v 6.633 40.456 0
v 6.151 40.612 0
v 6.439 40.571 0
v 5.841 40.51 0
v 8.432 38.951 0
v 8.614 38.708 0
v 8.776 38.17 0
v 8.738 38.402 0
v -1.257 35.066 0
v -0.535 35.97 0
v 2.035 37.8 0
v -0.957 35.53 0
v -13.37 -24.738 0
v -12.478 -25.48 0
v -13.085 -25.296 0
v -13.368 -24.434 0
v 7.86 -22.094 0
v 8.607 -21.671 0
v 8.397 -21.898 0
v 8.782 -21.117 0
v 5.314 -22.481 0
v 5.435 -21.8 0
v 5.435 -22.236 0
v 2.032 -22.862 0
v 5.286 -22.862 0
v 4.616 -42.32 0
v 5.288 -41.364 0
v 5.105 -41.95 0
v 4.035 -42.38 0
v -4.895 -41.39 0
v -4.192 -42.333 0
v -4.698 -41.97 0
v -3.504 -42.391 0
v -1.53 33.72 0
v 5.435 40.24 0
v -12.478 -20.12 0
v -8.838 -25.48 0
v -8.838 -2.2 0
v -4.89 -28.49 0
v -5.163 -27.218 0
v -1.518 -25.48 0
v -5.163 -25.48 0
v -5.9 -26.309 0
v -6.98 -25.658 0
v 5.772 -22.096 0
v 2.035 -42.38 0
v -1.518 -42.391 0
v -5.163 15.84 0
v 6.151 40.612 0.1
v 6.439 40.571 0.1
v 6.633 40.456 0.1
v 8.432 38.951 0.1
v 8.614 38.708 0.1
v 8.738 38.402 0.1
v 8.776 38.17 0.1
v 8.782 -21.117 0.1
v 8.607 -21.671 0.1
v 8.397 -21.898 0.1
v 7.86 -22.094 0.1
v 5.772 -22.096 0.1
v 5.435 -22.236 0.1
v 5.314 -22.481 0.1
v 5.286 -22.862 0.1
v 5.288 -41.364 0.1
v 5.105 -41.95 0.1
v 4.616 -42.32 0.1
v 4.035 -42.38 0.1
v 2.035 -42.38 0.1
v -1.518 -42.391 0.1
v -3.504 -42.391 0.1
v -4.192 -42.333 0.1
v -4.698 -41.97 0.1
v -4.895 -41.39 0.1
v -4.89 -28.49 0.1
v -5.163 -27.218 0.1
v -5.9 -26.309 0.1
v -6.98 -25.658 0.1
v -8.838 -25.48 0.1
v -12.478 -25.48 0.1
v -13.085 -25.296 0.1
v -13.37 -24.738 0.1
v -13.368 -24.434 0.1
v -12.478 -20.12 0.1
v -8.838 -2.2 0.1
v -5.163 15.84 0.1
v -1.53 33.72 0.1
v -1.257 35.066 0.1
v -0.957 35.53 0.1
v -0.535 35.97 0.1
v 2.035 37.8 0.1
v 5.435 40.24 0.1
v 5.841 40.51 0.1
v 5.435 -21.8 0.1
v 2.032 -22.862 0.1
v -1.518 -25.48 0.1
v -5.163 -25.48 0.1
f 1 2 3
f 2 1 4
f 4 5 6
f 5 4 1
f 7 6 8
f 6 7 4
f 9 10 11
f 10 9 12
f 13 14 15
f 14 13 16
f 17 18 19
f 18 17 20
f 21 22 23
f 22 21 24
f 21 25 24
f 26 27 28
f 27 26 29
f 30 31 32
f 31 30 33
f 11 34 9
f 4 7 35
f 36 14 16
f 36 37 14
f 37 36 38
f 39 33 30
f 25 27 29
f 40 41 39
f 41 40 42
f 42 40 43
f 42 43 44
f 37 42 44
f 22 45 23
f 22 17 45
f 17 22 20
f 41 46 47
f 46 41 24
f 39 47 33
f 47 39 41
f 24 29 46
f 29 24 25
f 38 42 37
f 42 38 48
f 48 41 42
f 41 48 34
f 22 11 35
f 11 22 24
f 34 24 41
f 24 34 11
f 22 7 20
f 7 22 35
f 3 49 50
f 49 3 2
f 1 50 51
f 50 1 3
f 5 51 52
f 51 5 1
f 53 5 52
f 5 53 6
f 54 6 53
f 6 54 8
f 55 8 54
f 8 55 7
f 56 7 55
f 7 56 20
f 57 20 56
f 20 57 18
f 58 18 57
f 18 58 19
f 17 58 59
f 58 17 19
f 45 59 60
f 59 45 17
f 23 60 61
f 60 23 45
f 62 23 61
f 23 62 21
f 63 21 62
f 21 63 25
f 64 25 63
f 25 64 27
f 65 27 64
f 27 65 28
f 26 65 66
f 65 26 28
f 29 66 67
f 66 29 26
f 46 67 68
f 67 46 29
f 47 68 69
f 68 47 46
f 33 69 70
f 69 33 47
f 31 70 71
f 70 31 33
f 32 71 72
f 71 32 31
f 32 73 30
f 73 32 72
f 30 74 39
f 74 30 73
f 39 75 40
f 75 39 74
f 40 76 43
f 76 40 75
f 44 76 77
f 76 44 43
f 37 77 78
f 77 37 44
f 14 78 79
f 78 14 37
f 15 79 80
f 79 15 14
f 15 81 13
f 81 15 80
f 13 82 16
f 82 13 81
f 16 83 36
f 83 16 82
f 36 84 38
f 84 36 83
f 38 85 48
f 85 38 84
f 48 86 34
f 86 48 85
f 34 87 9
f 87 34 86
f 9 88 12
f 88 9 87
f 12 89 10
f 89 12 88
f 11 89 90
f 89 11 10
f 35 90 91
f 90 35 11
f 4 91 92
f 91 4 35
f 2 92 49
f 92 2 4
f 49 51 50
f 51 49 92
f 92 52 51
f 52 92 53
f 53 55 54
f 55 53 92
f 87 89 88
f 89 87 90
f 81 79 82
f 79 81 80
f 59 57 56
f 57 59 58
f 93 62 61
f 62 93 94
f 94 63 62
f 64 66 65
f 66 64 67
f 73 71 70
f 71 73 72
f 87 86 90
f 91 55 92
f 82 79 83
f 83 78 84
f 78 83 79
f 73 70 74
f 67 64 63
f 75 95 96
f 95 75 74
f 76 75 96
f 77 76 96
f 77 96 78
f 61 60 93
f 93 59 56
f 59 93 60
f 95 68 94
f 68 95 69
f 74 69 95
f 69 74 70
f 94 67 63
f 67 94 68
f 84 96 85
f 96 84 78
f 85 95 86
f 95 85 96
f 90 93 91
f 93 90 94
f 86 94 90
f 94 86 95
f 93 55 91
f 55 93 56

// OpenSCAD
// file: s/13710gs02.scad
use <../../lib.scad>
function ldraw_lib__s__13710gs02() = [
// 0 ~Sticker Top for Technic Panel Fairing Smooth (Long) Flat
// 0 Name: s\13710gs02.dat
// 0 Author: Philippe Hurbain [Philo]
// 0 !LDRAW_ORG Subpart UPDATE 2022-02
// 0 !LICENSE Licensed under CC BY 2.0 and CC BY 4.0 : see CAreadme.txt
// 
// 0 BFC CERTIFY CCW
  [0,"BFC","CERTIFY"],
  [0,"BFC","CCW"],
// 
// 0 !HISTORY 2022-03-06 [PTadmin] Official Update 2022-02
// 
// 
// 0 // Top surface
// 4 16 -14.602 -0.25 101.275 -15.378 -0.25 101.529 -16.097 -0.25 101.427 -16.582 -0.25 101.141
  [4,16,-14.602,-0.25,101.275,-15.378,-0.25,101.529,-16.097,-0.25,101.427,-16.582,-0.25,101.141],
// 4 16 -14.602 -0.25 101.275 -16.582 -0.25 101.141 -21.08 -0.25 97.378 -21.536 -0.25 96.769
  [4,16,-14.602,-0.25,101.275,-16.582,-0.25,101.141,-21.08,-0.25,97.378,-21.536,-0.25,96.769],
// 4 16 -14.602 -0.25 101.275 -21.536 -0.25 96.769 -21.844 -0.25 96.005 -21.94 -0.25 95.424
  [4,16,-14.602,-0.25,101.275,-21.536,-0.25,96.769,-21.844,-0.25,96.005,-21.94,-0.25,95.424],
// 4 16 3.142 -0.25 87.664 2.393 -0.25 88.826 1.338 -0.25 89.925 -5.087 -0.25 94.5
  [4,16,3.142,-0.25,87.664,2.393,-0.25,88.826,1.338,-0.25,89.925,-5.087,-0.25,94.5],
// 4 16 31.196 -0.25 -63.7 32.713 -0.25 -63.241 33.424 -0.25 -61.844 33.421 -0.25 -61.086
  [4,16,31.196,-0.25,-63.7,32.713,-0.25,-63.241,33.424,-0.25,-61.844,33.421,-0.25,-61.086],
// 4 16 -21.954 -0.25 -52.792 -21.518 -0.25 -54.177 -20.993 -0.25 -54.745 -19.65 -0.25 -55.236
  [4,16,-21.954,-0.25,-52.792,-21.518,-0.25,-54.177,-20.993,-0.25,-54.745,-19.65,-0.25,-55.236],
// 4 16 -13.588 -0.25 -55.589 -13.286 -0.25 -56.203 -5.08 -0.25 -57.154 -13.588 -0.25 -54.5
  [4,16,-13.588,-0.25,-55.589,-13.286,-0.25,-56.203,-5.08,-0.25,-57.154,-13.588,-0.25,-54.5],
// 3 16 -13.286 -0.25 -56.203 -13.216 -0.25 -57.156 -5.08 -0.25 -57.154
  [3,16,-13.286,-0.25,-56.203,-13.216,-0.25,-57.156,-5.08,-0.25,-57.154],
// 4 16 -13.22 -0.25 -103.409 -12.762 -0.25 -104.875 -11.54 -0.25 -105.799 -10.088 -0.25 -105.95
  [4,16,-13.22,-0.25,-103.409,-12.762,-0.25,-104.875,-11.54,-0.25,-105.799,-10.088,-0.25,-105.95],
// 4 16 8.76 -0.25 -105.977 10.481 -0.25 -105.833 11.744 -0.25 -104.924 12.237 -0.25 -103.474
  [4,16,8.76,-0.25,-105.977,10.481,-0.25,-105.833,11.744,-0.25,-104.924,12.237,-0.25,-103.474],
// 3 16 -5.087 -0.25 94.5 3.826 -0.25 84.3 3.142 -0.25 87.664
  [3,16,-5.087,-0.25,94.5,3.826,-0.25,84.3,3.142,-0.25,87.664],
// 3 16 -14.602 -0.25 101.275 -21.94 -0.25 95.424 -13.588 -0.25 100.6
  [3,16,-14.602,-0.25,101.275,-21.94,-0.25,95.424,-13.588,-0.25,100.6],
// 3 16 31.196 -0.25 -50.3 31.196 -0.25 -63.7 33.421 -0.25 -61.086
  [3,16,31.196,-0.25,-50.3,31.196,-0.25,-63.7,33.421,-0.25,-61.086],
// 4 16 22.095 -0.25 -63.7 31.196 -0.25 -63.7 31.196 -0.25 -50.3 22.095 -0.25 -5.5
  [4,16,22.095,-0.25,-63.7,31.196,-0.25,-63.7,31.196,-0.25,-50.3,22.095,-0.25,-5.5],
// 3 16 12.225 -0.25 -71.225 8.76 -0.25 -105.977 12.237 -0.25 -103.474
  [3,16,12.225,-0.25,-71.225,8.76,-0.25,-105.977,12.237,-0.25,-103.474],
// 3 16 -13.216 -0.25 -57.156 -13.22 -0.25 -103.409 -10.088 -0.25 -105.95
  [3,16,-13.216,-0.25,-57.156,-13.22,-0.25,-103.409,-10.088,-0.25,-105.95],
// 4 16 3.795 -0.25 -63.7 12.225 -0.25 -71.225 12.908 -0.25 -68.044 12.908 -0.25 -63.7
  [4,16,3.795,-0.25,-63.7,12.225,-0.25,-71.225,12.908,-0.25,-68.044,12.908,-0.25,-63.7],
// 3 16 12.908 -0.25 -63.7 12.908 -0.25 -68.044 14.749 -0.25 -65.772
  [3,16,12.908,-0.25,-63.7,12.908,-0.25,-68.044,14.749,-0.25,-65.772],
// 3 16 12.908 -0.25 -63.7 14.749 -0.25 -65.772 17.451 -0.25 -64.144
  [3,16,12.908,-0.25,-63.7,14.749,-0.25,-65.772,17.451,-0.25,-64.144],
// 3 16 22.095 -0.25 -63.7 12.908 -0.25 -63.7 17.451 -0.25 -64.144
  [3,16,22.095,-0.25,-63.7,12.908,-0.25,-63.7,17.451,-0.25,-64.144],
// 3 16 -13.588 -0.25 -54.5 -14.429 -0.25 -55.241 -13.588 -0.25 -55.589
  [3,16,-13.588,-0.25,-54.5,-14.429,-0.25,-55.241,-13.588,-0.25,-55.589],
// 4 16 -19.65 -0.25 -55.236 -14.429 -0.25 -55.241 -13.588 -0.25 -54.5 -21.954 -0.25 -52.792
  [4,16,-19.65,-0.25,-55.236,-14.429,-0.25,-55.241,-13.588,-0.25,-54.5,-21.954,-0.25,-52.792],
// 4 16 -5.08 -0.25 -57.154 -5.087 -0.25 -105.95 3.795 -0.25 -105.977 3.795 -0.25 -63.7
  [4,16,-5.08,-0.25,-57.154,-5.087,-0.25,-105.95,3.795,-0.25,-105.977,3.795,-0.25,-63.7],
// 4 16 3.795 -0.25 -63.7 3.795 -0.25 -105.977 8.76 -0.25 -105.977 12.225 -0.25 -71.225
  [4,16,3.795,-0.25,-63.7,3.795,-0.25,-105.977,8.76,-0.25,-105.977,12.225,-0.25,-71.225],
// 4 16 -10.088 -0.25 -105.95 -5.087 -0.25 -105.95 -5.08 -0.25 -57.154 -13.216 -0.25 -57.156
  [4,16,-10.088,-0.25,-105.95,-5.087,-0.25,-105.95,-5.08,-0.25,-57.154,-13.216,-0.25,-57.156],
// 4 16 12.908 -0.25 -63.7 22.095 -0.25 -63.7 22.095 -0.25 -5.5 12.908 -0.25 39.6
  [4,16,12.908,-0.25,-63.7,22.095,-0.25,-63.7,22.095,-0.25,-5.5,12.908,-0.25,39.6],
// 4 16 3.795 -0.25 -63.7 12.908 -0.25 -63.7 12.908 -0.25 39.6 3.826 -0.25 84.3
  [4,16,3.795,-0.25,-63.7,12.908,-0.25,-63.7,12.908,-0.25,39.6,3.826,-0.25,84.3],
// 4 16 -5.087 -0.25 94.5 -13.588 -0.25 100.6 -13.588 -0.25 -54.5 -5.08 -0.25 -57.154
  [4,16,-5.087,-0.25,94.5,-13.588,-0.25,100.6,-13.588,-0.25,-54.5,-5.08,-0.25,-57.154],
// 4 16 3.826 -0.25 84.3 -5.087 -0.25 94.5 -5.08 -0.25 -57.154 3.795 -0.25 -63.7
  [4,16,3.826,-0.25,84.3,-5.087,-0.25,94.5,-5.08,-0.25,-57.154,3.795,-0.25,-63.7],
// 4 16 -13.588 -0.25 100.6 -21.94 -0.25 95.424 -21.954 -0.25 -52.792 -13.588 -0.25 -54.5
  [4,16,-13.588,-0.25,100.6,-21.94,-0.25,95.424,-21.954,-0.25,-52.792,-13.588,-0.25,-54.5],
];
makepoly(ldraw_lib__s__13710gs02(), line=0.2);
// main file
use <../lib.scad>
use <s/13710gs01.scad>
use <s/13710gs02.scad>
function ldraw_lib__13710g() = [
// 0 Sticker Mindstorms EV3 #7 for Panel Smooth Long (Needs Work)
// 0 Name: 13710g.dat
// 0 Author: Philippe Hurbain [Philo]
// 0 !LDRAW_ORG Part UPDATE 2022-02
// 0 !LICENSE Licensed under CC BY 2.0 and CC BY 4.0 : see CAreadme.txt
// 
// 0 !HELP To be used with panel 64681
// 
// 0 BFC CERTIFY CCW
  [0,"BFC","CERTIFY"],
  [0,"BFC","CCW"],
// 
// 0 !HISTORY 2022-03-06 [PTadmin] Official Update 2022-02
// 
// 
// 0 // Image file courtesy of the LEGO MINDSTORMS Team
// 0 // Needs Work: Missing more detailed fallback pattern
// 
// 1 16 0 0 0 -1 0 0 0 1 0 0 0 1 s\13710gs01.dat
  [1,16,0,0,0,-1,0,0,0,1,0,0,0,1, ldraw_lib__s__13710gs01()],
// 0 !TEXMAP START PLANAR -33.424 12.0264 -105.977 -33.424 12.0264 101.529 21.954 12.0264 -105.977 13710g.png
// 0 !: 1 15 0 0 0 -1 0 0 0 1 0 0 0 1 s\13710gs02.dat
// 0 !TEXMAP FALLBACK
// 1 15 0 0 0 -1 0 0 0 1 0 0 0 1 s\13710gs02.dat
  [1,15,0,0,0,-1,0,0,0,1,0,0,0,1, ldraw_lib__s__13710gs02()],
// 0 !TEXMAP END
];
makepoly(ldraw_lib__13710g(), line=0.2);
